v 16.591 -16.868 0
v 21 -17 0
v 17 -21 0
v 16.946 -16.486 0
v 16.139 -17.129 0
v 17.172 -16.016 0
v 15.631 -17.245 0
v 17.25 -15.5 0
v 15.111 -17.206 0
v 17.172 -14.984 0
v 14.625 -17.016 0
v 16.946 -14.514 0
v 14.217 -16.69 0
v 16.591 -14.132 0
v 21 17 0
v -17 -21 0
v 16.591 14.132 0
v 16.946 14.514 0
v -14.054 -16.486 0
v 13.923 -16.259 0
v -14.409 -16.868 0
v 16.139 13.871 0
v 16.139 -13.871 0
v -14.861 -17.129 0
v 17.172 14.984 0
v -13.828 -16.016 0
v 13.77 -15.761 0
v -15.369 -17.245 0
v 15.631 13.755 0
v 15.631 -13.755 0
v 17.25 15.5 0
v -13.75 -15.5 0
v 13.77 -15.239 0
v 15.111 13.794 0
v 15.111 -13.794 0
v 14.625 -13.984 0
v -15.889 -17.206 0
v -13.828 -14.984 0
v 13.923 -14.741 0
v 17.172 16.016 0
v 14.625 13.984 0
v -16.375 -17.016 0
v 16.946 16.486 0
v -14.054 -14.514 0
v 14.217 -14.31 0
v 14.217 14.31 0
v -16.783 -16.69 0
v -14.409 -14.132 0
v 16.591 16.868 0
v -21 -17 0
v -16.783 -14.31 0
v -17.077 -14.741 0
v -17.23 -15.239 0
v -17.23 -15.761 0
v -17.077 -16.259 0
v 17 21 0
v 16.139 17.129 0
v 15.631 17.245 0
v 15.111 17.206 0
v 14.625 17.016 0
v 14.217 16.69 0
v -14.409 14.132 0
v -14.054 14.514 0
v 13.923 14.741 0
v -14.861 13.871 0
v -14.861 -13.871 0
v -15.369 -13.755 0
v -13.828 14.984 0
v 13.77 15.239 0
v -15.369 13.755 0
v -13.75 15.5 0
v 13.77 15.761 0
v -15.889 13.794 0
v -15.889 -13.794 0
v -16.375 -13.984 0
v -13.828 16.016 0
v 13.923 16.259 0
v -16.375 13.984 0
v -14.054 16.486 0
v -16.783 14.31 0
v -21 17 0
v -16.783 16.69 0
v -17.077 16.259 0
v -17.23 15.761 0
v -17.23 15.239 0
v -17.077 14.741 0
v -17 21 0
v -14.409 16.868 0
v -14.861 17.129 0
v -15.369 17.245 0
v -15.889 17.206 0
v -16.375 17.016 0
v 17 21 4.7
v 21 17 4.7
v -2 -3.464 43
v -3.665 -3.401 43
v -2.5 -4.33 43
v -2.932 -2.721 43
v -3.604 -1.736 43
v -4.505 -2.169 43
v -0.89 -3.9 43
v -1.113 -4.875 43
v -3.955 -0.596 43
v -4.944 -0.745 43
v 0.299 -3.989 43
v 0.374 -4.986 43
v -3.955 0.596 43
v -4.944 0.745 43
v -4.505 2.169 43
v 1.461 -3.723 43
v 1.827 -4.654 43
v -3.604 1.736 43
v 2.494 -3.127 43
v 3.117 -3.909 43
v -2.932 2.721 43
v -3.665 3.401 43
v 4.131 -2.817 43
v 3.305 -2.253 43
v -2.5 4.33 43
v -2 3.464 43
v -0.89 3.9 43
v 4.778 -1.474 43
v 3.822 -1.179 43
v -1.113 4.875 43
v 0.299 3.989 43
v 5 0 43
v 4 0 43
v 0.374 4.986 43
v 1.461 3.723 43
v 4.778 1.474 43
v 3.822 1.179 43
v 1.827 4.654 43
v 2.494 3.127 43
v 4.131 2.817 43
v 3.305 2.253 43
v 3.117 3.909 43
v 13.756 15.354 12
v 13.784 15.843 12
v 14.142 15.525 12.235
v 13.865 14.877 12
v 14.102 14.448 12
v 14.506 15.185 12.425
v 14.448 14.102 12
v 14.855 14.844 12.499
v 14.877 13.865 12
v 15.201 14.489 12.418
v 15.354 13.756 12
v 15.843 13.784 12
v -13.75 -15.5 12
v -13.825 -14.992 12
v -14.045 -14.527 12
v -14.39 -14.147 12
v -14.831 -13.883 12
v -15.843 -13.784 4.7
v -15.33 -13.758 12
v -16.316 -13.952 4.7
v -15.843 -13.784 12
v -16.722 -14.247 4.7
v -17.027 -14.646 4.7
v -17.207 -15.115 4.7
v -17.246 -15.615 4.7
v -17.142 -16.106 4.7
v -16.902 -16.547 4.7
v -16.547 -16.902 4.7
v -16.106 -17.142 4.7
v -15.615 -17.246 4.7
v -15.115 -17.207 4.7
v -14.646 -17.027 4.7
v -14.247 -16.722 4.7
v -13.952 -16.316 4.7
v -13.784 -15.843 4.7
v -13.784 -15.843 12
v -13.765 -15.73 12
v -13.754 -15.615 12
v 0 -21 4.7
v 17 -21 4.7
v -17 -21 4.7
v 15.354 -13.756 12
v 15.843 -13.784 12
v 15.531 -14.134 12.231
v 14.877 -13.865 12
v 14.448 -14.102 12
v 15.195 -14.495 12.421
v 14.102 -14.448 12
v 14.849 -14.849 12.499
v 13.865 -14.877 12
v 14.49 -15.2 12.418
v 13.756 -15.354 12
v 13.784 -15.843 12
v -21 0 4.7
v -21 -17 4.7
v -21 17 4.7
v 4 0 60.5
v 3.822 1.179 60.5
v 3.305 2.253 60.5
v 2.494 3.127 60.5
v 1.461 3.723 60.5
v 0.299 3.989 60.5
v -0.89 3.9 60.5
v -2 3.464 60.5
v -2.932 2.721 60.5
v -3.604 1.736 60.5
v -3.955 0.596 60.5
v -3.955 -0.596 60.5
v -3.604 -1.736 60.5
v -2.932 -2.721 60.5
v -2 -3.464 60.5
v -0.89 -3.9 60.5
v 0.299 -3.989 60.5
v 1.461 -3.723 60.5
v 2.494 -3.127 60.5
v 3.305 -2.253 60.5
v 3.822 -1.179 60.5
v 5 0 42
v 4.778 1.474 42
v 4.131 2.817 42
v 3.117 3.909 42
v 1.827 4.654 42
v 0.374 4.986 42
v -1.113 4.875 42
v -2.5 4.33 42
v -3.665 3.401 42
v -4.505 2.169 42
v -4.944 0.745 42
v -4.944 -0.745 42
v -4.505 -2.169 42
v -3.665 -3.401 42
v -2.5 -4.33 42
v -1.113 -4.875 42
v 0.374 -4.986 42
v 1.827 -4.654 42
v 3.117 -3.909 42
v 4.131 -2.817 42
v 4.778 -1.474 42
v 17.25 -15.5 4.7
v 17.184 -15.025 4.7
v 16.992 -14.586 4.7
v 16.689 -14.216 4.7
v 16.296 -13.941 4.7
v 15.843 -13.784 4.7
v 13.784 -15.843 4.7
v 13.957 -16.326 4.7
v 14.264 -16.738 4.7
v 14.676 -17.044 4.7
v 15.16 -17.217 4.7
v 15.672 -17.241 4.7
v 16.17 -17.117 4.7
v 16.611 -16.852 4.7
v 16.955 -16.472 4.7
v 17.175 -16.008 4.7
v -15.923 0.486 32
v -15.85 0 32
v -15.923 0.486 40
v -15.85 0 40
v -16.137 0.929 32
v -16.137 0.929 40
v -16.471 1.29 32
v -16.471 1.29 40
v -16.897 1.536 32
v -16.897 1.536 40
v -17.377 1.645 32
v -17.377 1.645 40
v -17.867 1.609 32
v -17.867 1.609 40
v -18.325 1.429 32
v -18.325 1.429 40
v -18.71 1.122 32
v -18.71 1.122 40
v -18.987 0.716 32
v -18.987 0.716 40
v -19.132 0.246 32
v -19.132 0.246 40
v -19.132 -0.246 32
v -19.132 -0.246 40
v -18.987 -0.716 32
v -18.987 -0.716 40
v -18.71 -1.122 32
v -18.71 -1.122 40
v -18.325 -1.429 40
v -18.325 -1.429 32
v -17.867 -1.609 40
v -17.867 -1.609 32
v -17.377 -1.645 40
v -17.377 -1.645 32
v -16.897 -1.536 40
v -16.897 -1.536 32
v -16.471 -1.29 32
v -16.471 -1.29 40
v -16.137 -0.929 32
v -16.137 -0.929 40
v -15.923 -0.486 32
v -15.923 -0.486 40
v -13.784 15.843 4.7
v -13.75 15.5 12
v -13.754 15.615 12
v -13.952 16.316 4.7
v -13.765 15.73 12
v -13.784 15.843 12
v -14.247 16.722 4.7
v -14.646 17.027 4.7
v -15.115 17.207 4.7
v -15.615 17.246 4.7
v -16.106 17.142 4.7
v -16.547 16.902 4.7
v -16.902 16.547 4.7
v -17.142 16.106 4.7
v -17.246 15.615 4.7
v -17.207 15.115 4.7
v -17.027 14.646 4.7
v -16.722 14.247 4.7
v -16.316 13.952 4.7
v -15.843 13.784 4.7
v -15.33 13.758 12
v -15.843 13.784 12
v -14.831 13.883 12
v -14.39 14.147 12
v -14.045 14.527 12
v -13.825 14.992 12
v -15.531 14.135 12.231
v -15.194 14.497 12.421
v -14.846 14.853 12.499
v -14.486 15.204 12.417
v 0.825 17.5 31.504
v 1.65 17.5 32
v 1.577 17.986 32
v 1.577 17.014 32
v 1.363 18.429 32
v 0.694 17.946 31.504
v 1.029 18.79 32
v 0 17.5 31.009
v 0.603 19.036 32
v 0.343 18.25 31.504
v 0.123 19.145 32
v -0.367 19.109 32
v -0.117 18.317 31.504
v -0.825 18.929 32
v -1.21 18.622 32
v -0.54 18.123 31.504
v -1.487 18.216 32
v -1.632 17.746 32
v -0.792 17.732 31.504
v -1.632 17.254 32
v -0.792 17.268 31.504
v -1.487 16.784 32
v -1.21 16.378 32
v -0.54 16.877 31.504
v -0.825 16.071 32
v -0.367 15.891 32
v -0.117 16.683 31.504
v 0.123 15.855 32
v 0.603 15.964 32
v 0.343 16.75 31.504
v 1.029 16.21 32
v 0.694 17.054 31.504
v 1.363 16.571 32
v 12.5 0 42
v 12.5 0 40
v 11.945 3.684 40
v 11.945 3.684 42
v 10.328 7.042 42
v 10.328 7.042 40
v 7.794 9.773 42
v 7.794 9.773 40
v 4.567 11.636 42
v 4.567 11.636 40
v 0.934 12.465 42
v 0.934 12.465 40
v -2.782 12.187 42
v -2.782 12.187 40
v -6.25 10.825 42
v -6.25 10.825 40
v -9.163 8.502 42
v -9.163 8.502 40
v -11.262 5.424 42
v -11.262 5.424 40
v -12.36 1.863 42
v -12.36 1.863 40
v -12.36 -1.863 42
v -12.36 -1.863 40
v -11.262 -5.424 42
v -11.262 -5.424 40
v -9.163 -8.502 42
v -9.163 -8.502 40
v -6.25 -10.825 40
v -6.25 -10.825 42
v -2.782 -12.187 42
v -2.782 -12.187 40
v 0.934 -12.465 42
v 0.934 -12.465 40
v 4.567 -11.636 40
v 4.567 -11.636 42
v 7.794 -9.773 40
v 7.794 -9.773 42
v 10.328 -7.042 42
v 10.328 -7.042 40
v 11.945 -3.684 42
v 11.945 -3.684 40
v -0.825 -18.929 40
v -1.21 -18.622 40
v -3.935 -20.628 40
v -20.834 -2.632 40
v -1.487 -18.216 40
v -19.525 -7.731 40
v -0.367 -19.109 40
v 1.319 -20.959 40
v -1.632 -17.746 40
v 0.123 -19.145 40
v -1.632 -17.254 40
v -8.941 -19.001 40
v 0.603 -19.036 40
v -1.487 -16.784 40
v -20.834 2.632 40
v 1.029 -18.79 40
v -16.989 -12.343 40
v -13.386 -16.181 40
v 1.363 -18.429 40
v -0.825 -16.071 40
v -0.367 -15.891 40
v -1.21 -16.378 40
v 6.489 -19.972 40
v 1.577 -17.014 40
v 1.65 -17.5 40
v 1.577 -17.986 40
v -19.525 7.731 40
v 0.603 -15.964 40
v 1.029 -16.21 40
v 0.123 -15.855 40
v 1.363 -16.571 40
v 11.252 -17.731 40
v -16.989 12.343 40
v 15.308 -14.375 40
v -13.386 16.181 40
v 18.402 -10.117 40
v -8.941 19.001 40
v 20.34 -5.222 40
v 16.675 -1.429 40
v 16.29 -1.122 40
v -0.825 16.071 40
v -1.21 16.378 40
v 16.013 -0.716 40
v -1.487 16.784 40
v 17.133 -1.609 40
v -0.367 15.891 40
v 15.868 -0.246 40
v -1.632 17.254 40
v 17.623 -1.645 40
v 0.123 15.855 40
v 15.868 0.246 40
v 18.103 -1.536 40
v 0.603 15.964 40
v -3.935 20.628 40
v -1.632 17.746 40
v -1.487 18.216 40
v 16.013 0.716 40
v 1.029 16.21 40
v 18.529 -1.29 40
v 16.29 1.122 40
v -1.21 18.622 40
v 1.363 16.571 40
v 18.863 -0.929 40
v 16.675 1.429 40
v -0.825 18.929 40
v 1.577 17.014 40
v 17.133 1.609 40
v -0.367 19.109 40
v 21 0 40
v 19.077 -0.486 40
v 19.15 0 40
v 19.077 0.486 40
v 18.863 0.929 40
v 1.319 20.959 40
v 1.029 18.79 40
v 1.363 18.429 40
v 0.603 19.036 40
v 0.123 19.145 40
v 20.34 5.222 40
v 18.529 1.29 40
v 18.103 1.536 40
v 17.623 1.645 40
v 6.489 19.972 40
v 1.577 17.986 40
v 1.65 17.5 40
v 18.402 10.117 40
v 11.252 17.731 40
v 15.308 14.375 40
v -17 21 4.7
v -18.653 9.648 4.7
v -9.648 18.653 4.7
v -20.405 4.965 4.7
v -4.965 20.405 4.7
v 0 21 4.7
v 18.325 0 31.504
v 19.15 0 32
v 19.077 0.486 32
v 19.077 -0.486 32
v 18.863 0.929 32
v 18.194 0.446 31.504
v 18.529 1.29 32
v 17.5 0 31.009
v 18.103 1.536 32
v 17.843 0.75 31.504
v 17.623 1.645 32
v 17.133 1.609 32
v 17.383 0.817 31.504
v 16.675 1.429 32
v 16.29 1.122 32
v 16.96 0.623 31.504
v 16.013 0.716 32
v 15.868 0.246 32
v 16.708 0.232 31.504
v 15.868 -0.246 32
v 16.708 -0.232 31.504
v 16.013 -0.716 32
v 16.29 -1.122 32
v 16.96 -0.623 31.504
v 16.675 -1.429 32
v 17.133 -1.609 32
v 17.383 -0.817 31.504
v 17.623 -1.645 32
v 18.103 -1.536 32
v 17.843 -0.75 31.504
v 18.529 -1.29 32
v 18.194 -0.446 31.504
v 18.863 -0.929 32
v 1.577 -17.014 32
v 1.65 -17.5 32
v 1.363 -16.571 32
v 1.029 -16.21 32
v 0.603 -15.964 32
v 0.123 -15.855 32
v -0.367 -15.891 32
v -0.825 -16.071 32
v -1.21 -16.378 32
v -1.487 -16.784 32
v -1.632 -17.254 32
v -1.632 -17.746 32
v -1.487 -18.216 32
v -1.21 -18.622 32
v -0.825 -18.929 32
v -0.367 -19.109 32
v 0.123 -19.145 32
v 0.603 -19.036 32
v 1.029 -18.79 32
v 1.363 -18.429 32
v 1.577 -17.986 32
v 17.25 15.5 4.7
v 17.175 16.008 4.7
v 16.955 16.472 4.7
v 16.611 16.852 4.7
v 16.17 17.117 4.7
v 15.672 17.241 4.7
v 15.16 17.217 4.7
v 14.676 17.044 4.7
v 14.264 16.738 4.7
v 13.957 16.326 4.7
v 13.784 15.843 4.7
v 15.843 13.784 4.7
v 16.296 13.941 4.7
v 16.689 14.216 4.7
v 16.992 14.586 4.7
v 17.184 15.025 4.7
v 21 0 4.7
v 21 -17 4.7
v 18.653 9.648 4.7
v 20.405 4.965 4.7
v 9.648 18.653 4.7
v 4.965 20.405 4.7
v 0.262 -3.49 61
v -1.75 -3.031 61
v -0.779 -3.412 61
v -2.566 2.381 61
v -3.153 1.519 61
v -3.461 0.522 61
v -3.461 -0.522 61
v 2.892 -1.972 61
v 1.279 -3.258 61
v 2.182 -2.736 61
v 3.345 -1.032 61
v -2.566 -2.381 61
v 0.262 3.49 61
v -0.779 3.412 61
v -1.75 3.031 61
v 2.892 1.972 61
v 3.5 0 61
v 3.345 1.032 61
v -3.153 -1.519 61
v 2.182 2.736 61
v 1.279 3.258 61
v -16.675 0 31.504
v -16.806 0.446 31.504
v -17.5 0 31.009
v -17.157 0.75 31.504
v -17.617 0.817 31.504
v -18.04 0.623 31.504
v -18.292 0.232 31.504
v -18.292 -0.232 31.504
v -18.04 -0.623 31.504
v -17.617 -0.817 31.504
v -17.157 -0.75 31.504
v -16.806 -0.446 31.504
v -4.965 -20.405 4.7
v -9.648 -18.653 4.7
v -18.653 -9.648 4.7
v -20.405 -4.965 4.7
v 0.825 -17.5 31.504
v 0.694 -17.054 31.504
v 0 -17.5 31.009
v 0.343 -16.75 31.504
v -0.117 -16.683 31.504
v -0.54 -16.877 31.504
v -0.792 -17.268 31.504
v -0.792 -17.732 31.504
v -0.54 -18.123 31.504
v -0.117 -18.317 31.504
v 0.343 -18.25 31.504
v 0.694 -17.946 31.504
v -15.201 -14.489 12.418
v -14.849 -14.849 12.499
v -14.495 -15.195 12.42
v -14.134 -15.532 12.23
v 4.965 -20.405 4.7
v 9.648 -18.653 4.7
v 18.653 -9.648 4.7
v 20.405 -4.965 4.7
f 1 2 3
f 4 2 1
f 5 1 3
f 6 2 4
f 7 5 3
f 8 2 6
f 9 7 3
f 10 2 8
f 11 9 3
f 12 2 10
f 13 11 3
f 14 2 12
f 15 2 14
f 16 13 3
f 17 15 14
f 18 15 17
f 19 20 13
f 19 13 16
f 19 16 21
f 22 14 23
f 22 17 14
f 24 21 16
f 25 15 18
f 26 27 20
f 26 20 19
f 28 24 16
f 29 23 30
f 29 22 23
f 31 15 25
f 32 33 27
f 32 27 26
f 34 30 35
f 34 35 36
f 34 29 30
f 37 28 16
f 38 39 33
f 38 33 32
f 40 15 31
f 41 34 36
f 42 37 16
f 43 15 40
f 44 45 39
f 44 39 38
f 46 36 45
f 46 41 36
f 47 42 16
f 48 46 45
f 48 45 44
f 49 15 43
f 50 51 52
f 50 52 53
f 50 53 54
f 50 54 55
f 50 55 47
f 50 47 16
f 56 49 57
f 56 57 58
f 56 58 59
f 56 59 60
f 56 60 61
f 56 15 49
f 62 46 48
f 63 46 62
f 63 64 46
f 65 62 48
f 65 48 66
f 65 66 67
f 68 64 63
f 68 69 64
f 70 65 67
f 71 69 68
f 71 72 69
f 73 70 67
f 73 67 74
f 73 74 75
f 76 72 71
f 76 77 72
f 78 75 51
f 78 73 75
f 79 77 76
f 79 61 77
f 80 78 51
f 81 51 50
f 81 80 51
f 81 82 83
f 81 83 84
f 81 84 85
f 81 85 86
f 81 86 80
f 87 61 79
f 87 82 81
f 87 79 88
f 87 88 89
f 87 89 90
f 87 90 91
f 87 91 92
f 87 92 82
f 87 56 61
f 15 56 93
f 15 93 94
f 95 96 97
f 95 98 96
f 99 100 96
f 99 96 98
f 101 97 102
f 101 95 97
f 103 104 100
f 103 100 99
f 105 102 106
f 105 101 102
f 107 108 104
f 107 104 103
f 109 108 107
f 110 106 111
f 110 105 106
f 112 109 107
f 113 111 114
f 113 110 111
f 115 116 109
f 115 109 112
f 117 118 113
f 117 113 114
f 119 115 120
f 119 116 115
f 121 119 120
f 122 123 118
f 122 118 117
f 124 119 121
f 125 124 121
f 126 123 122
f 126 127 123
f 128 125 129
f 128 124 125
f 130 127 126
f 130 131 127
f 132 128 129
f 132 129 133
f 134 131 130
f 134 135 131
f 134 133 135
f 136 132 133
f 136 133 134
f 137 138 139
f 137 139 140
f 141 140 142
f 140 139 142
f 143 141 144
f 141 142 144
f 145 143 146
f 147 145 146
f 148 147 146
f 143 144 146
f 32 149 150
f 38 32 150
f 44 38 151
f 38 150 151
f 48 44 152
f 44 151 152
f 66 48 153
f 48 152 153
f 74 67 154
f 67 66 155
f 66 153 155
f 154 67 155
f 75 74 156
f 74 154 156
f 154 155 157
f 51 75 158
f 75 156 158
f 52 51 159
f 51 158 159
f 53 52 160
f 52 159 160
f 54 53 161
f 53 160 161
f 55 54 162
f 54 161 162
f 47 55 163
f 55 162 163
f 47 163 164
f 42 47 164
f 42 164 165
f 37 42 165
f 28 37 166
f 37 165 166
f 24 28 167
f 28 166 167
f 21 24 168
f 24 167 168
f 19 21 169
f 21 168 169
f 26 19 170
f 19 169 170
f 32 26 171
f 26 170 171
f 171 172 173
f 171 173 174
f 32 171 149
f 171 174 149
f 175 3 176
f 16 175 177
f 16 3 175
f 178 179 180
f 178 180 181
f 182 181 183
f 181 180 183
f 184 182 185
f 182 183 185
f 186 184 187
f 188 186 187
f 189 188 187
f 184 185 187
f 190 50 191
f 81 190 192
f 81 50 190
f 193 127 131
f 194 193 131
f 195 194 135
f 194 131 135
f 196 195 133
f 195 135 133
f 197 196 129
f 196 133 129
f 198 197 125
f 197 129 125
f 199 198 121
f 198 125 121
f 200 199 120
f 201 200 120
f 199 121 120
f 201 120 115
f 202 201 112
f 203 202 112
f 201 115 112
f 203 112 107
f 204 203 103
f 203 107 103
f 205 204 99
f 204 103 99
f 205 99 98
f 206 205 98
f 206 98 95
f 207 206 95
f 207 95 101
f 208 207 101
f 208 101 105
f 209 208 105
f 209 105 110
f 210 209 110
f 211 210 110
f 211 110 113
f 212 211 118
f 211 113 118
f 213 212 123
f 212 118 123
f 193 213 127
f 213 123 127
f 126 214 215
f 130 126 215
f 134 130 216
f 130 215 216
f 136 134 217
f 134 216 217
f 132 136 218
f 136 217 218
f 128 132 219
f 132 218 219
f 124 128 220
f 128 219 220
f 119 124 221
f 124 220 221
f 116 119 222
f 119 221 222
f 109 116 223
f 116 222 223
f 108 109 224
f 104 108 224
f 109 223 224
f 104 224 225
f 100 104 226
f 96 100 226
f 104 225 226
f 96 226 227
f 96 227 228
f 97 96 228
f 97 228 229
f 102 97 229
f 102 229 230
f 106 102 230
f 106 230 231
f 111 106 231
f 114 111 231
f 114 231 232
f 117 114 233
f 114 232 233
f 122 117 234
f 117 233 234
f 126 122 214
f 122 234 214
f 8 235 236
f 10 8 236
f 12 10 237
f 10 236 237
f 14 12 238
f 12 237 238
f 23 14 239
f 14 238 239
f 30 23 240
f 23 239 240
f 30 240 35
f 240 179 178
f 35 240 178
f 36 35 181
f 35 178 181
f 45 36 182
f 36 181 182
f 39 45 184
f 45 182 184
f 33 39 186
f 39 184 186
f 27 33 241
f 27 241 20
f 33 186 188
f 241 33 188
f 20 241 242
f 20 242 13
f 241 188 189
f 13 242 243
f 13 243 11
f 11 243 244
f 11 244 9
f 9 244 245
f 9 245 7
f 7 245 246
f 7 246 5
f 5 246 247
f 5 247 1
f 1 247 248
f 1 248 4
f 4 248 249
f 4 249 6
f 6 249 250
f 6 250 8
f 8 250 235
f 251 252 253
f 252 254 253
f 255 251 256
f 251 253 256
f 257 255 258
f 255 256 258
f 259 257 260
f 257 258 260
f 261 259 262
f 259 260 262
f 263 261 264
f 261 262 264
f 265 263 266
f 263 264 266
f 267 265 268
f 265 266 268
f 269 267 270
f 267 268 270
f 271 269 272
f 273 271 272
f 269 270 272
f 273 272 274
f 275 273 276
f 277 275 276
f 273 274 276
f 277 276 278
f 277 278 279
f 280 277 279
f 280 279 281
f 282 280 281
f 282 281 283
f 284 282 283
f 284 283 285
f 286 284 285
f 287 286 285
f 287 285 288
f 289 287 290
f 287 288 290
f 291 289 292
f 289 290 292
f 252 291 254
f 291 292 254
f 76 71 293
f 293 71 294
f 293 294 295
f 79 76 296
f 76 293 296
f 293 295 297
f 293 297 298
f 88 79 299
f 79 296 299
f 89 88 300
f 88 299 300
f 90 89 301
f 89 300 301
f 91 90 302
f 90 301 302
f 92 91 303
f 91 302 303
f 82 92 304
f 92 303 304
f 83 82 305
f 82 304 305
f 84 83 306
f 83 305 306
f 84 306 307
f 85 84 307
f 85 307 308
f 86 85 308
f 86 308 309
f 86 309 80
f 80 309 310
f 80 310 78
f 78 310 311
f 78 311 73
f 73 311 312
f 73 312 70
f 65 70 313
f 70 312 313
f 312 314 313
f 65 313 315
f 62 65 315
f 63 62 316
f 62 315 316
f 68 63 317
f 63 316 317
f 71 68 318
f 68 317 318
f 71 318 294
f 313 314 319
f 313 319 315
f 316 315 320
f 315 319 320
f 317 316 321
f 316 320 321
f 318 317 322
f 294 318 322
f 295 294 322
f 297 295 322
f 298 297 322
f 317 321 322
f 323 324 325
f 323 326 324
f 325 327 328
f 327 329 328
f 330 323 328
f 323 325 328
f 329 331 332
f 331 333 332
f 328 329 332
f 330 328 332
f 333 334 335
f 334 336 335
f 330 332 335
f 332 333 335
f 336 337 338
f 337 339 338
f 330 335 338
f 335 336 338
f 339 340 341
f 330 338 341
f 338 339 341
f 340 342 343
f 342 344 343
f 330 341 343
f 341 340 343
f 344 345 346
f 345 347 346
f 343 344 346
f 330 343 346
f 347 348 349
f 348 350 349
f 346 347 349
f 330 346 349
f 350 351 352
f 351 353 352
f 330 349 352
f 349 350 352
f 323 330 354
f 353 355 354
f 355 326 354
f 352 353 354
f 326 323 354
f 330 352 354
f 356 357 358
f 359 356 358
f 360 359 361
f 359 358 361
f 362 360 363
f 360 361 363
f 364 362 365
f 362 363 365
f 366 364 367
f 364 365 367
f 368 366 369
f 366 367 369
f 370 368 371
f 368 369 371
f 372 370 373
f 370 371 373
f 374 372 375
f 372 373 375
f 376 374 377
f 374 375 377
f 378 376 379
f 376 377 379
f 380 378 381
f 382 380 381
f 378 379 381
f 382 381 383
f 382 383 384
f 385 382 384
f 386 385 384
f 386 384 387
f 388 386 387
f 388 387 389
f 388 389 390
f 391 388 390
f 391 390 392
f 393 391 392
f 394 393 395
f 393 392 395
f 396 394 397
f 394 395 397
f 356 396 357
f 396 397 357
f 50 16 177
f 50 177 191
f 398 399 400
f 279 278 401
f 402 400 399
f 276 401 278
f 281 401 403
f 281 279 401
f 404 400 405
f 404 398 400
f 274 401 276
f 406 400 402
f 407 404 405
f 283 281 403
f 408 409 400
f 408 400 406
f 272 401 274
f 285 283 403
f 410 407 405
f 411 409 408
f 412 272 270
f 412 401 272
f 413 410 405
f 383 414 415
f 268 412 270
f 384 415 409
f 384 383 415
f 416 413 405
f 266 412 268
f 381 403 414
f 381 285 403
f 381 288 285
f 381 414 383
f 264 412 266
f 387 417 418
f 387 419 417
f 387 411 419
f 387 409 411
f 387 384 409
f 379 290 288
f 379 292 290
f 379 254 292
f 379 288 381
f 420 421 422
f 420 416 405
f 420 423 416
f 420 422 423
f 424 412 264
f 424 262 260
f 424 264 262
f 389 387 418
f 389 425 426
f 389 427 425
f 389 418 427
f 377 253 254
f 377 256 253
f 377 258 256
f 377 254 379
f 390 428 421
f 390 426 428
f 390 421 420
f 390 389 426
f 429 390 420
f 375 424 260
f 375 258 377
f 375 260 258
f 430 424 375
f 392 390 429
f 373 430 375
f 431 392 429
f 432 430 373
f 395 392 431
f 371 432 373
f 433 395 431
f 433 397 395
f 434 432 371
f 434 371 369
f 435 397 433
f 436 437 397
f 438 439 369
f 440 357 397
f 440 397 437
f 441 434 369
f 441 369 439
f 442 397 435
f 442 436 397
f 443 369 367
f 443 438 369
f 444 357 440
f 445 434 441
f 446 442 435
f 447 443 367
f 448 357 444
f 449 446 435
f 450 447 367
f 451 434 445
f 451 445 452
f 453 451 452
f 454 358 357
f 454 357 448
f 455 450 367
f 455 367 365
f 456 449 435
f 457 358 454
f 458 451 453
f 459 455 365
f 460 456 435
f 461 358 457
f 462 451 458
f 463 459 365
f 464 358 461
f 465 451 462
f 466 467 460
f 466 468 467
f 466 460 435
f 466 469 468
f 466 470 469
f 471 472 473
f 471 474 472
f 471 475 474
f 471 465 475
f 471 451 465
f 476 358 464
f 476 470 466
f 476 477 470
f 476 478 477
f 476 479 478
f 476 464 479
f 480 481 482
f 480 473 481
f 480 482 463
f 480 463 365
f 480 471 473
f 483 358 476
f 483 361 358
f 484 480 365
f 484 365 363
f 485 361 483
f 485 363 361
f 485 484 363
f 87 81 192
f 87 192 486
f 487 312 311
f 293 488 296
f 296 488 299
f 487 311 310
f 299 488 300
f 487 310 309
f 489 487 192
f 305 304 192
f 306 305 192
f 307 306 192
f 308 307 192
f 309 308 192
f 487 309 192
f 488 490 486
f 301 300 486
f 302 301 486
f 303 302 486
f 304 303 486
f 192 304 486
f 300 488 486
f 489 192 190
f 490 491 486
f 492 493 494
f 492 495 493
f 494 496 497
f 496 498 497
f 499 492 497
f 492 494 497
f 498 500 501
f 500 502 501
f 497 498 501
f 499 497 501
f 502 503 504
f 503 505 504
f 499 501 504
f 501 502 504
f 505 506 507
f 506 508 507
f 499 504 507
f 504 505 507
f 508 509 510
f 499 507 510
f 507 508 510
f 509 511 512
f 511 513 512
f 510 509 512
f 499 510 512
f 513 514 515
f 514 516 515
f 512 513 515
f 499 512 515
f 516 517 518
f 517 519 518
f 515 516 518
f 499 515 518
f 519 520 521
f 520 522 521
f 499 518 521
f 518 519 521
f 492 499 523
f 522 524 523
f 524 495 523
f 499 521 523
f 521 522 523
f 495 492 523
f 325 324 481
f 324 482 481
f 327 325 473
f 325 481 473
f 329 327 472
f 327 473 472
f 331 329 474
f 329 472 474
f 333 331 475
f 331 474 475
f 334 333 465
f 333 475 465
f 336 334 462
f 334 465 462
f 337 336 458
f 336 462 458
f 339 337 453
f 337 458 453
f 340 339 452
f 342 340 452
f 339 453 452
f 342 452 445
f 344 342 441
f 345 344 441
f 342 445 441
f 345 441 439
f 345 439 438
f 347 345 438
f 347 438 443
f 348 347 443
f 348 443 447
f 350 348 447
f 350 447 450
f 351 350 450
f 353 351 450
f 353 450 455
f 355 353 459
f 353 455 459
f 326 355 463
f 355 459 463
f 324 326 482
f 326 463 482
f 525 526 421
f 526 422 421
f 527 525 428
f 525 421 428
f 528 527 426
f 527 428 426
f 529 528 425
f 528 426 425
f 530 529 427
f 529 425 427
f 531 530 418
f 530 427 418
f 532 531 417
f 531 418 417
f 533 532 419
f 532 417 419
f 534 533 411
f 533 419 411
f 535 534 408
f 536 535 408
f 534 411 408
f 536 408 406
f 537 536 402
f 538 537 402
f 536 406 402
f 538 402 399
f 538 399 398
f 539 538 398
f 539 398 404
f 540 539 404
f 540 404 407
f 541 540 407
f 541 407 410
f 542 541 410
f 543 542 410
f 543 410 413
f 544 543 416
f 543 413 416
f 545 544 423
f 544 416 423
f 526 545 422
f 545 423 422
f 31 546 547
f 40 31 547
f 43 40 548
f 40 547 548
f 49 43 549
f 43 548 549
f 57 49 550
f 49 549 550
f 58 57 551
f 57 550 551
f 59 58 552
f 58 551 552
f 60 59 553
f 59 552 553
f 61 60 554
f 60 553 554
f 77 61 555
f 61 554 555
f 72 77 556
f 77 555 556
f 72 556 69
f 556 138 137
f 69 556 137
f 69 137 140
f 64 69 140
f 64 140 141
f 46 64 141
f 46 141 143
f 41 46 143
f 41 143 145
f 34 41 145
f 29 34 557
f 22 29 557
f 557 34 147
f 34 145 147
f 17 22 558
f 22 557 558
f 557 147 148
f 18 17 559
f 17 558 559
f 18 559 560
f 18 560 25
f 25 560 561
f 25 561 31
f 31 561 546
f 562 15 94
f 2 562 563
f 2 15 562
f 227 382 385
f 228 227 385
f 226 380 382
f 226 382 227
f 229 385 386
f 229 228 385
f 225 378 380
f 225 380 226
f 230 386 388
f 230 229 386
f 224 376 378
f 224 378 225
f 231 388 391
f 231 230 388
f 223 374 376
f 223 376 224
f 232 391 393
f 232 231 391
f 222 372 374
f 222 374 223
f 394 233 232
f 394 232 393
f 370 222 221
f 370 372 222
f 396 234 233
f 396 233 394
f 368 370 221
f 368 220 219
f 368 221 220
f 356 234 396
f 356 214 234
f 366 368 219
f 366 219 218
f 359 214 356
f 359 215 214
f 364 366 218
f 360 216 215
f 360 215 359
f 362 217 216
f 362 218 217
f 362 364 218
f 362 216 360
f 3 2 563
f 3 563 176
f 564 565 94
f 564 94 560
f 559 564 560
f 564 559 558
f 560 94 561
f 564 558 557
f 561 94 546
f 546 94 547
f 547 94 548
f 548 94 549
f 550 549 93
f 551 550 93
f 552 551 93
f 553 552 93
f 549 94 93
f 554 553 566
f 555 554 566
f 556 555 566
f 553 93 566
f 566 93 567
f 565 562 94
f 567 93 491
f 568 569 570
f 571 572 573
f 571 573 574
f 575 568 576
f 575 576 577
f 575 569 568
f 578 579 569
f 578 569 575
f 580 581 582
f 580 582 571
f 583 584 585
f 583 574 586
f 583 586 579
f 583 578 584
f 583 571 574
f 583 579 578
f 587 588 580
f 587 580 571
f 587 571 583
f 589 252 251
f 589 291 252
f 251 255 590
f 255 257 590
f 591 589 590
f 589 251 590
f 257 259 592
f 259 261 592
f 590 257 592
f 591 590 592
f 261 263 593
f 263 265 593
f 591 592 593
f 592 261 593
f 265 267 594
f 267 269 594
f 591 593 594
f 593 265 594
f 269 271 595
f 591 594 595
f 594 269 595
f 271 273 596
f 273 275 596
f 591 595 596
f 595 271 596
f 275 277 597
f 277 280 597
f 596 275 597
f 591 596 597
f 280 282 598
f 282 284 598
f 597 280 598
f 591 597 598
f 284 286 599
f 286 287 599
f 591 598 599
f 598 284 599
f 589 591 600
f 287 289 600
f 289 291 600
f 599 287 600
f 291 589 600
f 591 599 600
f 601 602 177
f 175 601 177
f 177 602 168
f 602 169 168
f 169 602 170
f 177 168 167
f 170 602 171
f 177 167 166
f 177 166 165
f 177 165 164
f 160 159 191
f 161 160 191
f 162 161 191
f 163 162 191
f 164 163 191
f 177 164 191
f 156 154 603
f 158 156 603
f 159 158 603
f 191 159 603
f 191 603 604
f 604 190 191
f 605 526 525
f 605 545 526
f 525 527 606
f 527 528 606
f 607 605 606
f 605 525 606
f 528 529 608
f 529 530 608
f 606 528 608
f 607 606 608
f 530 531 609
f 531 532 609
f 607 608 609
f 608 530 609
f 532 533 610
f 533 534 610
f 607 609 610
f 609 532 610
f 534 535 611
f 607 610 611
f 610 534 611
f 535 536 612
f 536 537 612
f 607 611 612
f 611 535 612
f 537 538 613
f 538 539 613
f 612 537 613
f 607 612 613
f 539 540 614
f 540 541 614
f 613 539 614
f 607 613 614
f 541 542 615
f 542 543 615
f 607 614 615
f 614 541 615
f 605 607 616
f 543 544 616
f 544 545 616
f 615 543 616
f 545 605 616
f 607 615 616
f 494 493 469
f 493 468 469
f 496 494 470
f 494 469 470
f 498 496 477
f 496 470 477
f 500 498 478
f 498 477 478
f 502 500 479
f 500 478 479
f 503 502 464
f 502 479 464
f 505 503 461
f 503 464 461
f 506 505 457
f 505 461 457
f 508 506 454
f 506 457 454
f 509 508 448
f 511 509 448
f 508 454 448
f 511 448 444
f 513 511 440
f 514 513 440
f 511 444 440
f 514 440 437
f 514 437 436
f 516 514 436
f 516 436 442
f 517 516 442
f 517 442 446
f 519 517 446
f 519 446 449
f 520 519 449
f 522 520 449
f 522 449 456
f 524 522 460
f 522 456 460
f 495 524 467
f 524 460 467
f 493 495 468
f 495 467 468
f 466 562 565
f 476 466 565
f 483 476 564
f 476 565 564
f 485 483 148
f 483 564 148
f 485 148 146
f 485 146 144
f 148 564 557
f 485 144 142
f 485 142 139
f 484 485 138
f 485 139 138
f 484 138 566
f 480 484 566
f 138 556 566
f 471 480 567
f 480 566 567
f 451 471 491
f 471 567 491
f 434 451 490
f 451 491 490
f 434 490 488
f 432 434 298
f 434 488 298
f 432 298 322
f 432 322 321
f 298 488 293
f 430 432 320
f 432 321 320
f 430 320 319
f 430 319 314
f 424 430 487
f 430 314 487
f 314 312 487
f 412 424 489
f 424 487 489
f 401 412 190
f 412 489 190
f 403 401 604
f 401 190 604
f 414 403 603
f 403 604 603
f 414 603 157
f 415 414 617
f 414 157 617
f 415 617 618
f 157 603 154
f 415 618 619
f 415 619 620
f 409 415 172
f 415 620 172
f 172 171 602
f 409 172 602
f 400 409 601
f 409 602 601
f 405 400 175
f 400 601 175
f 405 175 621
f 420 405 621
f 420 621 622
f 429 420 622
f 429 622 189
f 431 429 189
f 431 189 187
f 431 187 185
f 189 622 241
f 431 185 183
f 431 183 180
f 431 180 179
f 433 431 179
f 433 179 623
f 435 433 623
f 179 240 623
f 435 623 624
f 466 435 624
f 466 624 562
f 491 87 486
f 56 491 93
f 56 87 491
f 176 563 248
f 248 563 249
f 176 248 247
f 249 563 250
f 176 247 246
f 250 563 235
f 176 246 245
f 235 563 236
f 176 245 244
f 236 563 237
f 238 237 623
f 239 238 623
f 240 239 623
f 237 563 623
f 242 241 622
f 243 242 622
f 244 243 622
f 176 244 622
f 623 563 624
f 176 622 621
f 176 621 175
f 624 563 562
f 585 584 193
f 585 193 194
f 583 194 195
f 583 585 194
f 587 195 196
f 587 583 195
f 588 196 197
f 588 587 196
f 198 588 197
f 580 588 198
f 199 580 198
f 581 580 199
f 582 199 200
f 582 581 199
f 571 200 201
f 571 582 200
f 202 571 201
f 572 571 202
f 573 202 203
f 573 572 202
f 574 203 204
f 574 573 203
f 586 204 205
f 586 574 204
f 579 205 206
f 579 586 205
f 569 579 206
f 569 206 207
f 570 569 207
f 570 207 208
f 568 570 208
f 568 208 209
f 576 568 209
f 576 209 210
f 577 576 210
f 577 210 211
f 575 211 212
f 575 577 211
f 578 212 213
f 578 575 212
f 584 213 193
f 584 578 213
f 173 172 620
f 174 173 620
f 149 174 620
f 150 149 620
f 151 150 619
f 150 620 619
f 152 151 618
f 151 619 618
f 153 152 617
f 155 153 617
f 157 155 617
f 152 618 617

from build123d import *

# Parameters (mm, degrees)
BOSS_EXTRUDE1_DEPTH = 4.7
SKETCH2_R           = 21
BOSS_EXTRUDE2_DEPTH = 35.3
SKETCH9_R           = 12.5
BOSS_EXTRUDE3_DEPTH = 2
SKETCH10_R          = 5
BOSS_EXTRUDE4_DEPTH = 1
SKETCH11_R          = 4
BOSS_EXTRUDE5_DEPTH = 18
CHAMFER1_SIZE       = 0.5


# Read off the part's stored shape, not the designer's step: Ø3.5 (3.5) Diameter Hole1, Tap Drill for M4x0.7 Tap1
with BuildPart() as part:
    # Sketch1 → Boss-Extrude1 (new body)
    with BuildSketch(Plane.XY):
        Polygon((-21, 17), (-17, 21), (17, 21), (21, 17), (21, -17), (17, -21), (-17, -21), (-21, -17), align=None)
    extrude(amount=BOSS_EXTRUDE1_DEPTH)

    # Sketch2 → Boss-Extrude2 (add)
    with BuildSketch(Plane.XY.offset(4.7)):
        Circle(SKETCH2_R)
    extrude(amount=BOSS_EXTRUDE2_DEPTH)

    # Ø3.5 (3.5) Diameter Hole1 outline → Ø3.5 (3.5) Diameter Hole1 (revolve, cut)
    with BuildSketch(Plane(origin=(-15.5, 15.5, 0), x_dir=(1, 0, 0), z_dir=(0, -1, 0))):
        Polygon((1.75, 0), (1.75, 12), (0.919892113, 12.498779139), (0, 12.498779139), (0, 0), align=None)
    revolve(axis=Axis((-15.5, 15.5, 0), (0, 0, 1)), mode=Mode.SUBTRACT)

    # 3.5 _3.5_ Diameter Hole1 2 outline → 3.5 _3.5_ Diameter Hole1 2 (revolve, cut)
    with BuildSketch(Plane(origin=(15.5, -15.5, 0), x_dir=(1, 0, 0), z_dir=(0, -1, 0))):
        Polygon((1.75, 0), (1.75, 12), (0.919892113, 12.498779139), (0, 12.498779139), (0, 0), align=None)
    revolve(axis=Axis((15.5, -15.5, 0), (0, 0, 1)), mode=Mode.SUBTRACT)

    # 3.5 _3.5_ Diameter Hole1 3 outline → 3.5 _3.5_ Diameter Hole1 3 (revolve, cut)
    with BuildSketch(Plane(origin=(15.5, 15.5, 0), x_dir=(1, 0, 0), z_dir=(0, -1, 0))):
        Polygon((1.75, 0), (1.75, 12), (0.919892113, 12.498779139), (0, 12.498779139), (0, 0), align=None)
    revolve(axis=Axis((15.5, 15.5, 0), (0, 0, 1)), mode=Mode.SUBTRACT)

    # 3.5 _3.5_ Diameter Hole1 4 outline → 3.5 _3.5_ Diameter Hole1 4 (revolve, cut)
    with BuildSketch(Plane(origin=(-15.5, -15.5, 0), x_dir=(1, 0, 0), z_dir=(0, -1, 0))):
        Polygon((1.75, 0), (1.75, 12), (0.919892113, 12.498779139), (0, 12.498779139), (0, 0), align=None)
    revolve(axis=Axis((-15.5, -15.5, 0), (0, 0, 1)), mode=Mode.SUBTRACT)

    # Tap Drill for M4x0.7 Tap1 outline → Tap Drill for M4x0.7 Tap1 (revolve, cut)
    with BuildSketch(Plane(origin=(17.5, 0, 0), x_dir=(1, 0, 0), z_dir=(0, -1, 0))):
        Polygon((0, 40), (0, 31.008579979), (1.65, 32), (1.65, 40), align=None)
    revolve(axis=Axis((17.5, 0, 0), (0, 0, 1)), mode=Mode.SUBTRACT)

    # Tap Drill for M4x0.7 Tap1 2 outline → Tap Drill for M4x0.7 Tap1 2 (revolve, cut)
    with BuildSketch(Plane(origin=(-17.5, 0, 0), x_dir=(1, 0, 0), z_dir=(0, -1, 0))):
        Polygon((0, 40), (0, 31.008579979), (1.65, 32), (1.65, 40), align=None)
    revolve(axis=Axis((-17.5, 0, 0), (0, 0, 1)), mode=Mode.SUBTRACT)

    # Tap Drill for M4x0.7 Tap1 3 outline → Tap Drill for M4x0.7 Tap1 3 (revolve, cut)
    with BuildSketch(Plane.XZ.offset(17.5)):
        Polygon((0, 40), (0, 31.008579979), (1.65, 32), (1.65, 40), align=None)
    revolve(axis=Axis((0, -17.5, 0), (0, 0, 1)), mode=Mode.SUBTRACT)

    # Tap Drill for M4x0.7 Tap1 4 outline → Tap Drill for M4x0.7 Tap1 4 (revolve, cut)
    with BuildSketch(Plane.XZ.offset(-17.5)):
        Polygon((0, 40), (0, 31.008579979), (1.65, 32), (1.65, 40), align=None)
    revolve(axis=Axis((0, 17.5, 0), (0, 0, 1)), mode=Mode.SUBTRACT)

    # Sketch9 → Boss-Extrude3 (add)
    with BuildSketch(Plane.XY.offset(40)):
        Circle(SKETCH9_R)
    extrude(amount=BOSS_EXTRUDE3_DEPTH)

    # Sketch10 → Boss-Extrude4 (add)
    with BuildSketch(Plane.XY.offset(42)):
        Circle(SKETCH10_R)
    extrude(amount=BOSS_EXTRUDE4_DEPTH)

    # Sketch11 → Boss-Extrude5 (add)
    with BuildSketch(Plane.XY.offset(43)):
        Circle(SKETCH11_R)
    extrude(amount=BOSS_EXTRUDE5_DEPTH)

    # Chamfer1
    chamfer1_edges = [part.edges().sort_by_distance(p)[0] for p in [
        (-4, 0, 61),
    ]]
    chamfer(chamfer1_edges, length=CHAMFER1_SIZE)


solid = part.part
